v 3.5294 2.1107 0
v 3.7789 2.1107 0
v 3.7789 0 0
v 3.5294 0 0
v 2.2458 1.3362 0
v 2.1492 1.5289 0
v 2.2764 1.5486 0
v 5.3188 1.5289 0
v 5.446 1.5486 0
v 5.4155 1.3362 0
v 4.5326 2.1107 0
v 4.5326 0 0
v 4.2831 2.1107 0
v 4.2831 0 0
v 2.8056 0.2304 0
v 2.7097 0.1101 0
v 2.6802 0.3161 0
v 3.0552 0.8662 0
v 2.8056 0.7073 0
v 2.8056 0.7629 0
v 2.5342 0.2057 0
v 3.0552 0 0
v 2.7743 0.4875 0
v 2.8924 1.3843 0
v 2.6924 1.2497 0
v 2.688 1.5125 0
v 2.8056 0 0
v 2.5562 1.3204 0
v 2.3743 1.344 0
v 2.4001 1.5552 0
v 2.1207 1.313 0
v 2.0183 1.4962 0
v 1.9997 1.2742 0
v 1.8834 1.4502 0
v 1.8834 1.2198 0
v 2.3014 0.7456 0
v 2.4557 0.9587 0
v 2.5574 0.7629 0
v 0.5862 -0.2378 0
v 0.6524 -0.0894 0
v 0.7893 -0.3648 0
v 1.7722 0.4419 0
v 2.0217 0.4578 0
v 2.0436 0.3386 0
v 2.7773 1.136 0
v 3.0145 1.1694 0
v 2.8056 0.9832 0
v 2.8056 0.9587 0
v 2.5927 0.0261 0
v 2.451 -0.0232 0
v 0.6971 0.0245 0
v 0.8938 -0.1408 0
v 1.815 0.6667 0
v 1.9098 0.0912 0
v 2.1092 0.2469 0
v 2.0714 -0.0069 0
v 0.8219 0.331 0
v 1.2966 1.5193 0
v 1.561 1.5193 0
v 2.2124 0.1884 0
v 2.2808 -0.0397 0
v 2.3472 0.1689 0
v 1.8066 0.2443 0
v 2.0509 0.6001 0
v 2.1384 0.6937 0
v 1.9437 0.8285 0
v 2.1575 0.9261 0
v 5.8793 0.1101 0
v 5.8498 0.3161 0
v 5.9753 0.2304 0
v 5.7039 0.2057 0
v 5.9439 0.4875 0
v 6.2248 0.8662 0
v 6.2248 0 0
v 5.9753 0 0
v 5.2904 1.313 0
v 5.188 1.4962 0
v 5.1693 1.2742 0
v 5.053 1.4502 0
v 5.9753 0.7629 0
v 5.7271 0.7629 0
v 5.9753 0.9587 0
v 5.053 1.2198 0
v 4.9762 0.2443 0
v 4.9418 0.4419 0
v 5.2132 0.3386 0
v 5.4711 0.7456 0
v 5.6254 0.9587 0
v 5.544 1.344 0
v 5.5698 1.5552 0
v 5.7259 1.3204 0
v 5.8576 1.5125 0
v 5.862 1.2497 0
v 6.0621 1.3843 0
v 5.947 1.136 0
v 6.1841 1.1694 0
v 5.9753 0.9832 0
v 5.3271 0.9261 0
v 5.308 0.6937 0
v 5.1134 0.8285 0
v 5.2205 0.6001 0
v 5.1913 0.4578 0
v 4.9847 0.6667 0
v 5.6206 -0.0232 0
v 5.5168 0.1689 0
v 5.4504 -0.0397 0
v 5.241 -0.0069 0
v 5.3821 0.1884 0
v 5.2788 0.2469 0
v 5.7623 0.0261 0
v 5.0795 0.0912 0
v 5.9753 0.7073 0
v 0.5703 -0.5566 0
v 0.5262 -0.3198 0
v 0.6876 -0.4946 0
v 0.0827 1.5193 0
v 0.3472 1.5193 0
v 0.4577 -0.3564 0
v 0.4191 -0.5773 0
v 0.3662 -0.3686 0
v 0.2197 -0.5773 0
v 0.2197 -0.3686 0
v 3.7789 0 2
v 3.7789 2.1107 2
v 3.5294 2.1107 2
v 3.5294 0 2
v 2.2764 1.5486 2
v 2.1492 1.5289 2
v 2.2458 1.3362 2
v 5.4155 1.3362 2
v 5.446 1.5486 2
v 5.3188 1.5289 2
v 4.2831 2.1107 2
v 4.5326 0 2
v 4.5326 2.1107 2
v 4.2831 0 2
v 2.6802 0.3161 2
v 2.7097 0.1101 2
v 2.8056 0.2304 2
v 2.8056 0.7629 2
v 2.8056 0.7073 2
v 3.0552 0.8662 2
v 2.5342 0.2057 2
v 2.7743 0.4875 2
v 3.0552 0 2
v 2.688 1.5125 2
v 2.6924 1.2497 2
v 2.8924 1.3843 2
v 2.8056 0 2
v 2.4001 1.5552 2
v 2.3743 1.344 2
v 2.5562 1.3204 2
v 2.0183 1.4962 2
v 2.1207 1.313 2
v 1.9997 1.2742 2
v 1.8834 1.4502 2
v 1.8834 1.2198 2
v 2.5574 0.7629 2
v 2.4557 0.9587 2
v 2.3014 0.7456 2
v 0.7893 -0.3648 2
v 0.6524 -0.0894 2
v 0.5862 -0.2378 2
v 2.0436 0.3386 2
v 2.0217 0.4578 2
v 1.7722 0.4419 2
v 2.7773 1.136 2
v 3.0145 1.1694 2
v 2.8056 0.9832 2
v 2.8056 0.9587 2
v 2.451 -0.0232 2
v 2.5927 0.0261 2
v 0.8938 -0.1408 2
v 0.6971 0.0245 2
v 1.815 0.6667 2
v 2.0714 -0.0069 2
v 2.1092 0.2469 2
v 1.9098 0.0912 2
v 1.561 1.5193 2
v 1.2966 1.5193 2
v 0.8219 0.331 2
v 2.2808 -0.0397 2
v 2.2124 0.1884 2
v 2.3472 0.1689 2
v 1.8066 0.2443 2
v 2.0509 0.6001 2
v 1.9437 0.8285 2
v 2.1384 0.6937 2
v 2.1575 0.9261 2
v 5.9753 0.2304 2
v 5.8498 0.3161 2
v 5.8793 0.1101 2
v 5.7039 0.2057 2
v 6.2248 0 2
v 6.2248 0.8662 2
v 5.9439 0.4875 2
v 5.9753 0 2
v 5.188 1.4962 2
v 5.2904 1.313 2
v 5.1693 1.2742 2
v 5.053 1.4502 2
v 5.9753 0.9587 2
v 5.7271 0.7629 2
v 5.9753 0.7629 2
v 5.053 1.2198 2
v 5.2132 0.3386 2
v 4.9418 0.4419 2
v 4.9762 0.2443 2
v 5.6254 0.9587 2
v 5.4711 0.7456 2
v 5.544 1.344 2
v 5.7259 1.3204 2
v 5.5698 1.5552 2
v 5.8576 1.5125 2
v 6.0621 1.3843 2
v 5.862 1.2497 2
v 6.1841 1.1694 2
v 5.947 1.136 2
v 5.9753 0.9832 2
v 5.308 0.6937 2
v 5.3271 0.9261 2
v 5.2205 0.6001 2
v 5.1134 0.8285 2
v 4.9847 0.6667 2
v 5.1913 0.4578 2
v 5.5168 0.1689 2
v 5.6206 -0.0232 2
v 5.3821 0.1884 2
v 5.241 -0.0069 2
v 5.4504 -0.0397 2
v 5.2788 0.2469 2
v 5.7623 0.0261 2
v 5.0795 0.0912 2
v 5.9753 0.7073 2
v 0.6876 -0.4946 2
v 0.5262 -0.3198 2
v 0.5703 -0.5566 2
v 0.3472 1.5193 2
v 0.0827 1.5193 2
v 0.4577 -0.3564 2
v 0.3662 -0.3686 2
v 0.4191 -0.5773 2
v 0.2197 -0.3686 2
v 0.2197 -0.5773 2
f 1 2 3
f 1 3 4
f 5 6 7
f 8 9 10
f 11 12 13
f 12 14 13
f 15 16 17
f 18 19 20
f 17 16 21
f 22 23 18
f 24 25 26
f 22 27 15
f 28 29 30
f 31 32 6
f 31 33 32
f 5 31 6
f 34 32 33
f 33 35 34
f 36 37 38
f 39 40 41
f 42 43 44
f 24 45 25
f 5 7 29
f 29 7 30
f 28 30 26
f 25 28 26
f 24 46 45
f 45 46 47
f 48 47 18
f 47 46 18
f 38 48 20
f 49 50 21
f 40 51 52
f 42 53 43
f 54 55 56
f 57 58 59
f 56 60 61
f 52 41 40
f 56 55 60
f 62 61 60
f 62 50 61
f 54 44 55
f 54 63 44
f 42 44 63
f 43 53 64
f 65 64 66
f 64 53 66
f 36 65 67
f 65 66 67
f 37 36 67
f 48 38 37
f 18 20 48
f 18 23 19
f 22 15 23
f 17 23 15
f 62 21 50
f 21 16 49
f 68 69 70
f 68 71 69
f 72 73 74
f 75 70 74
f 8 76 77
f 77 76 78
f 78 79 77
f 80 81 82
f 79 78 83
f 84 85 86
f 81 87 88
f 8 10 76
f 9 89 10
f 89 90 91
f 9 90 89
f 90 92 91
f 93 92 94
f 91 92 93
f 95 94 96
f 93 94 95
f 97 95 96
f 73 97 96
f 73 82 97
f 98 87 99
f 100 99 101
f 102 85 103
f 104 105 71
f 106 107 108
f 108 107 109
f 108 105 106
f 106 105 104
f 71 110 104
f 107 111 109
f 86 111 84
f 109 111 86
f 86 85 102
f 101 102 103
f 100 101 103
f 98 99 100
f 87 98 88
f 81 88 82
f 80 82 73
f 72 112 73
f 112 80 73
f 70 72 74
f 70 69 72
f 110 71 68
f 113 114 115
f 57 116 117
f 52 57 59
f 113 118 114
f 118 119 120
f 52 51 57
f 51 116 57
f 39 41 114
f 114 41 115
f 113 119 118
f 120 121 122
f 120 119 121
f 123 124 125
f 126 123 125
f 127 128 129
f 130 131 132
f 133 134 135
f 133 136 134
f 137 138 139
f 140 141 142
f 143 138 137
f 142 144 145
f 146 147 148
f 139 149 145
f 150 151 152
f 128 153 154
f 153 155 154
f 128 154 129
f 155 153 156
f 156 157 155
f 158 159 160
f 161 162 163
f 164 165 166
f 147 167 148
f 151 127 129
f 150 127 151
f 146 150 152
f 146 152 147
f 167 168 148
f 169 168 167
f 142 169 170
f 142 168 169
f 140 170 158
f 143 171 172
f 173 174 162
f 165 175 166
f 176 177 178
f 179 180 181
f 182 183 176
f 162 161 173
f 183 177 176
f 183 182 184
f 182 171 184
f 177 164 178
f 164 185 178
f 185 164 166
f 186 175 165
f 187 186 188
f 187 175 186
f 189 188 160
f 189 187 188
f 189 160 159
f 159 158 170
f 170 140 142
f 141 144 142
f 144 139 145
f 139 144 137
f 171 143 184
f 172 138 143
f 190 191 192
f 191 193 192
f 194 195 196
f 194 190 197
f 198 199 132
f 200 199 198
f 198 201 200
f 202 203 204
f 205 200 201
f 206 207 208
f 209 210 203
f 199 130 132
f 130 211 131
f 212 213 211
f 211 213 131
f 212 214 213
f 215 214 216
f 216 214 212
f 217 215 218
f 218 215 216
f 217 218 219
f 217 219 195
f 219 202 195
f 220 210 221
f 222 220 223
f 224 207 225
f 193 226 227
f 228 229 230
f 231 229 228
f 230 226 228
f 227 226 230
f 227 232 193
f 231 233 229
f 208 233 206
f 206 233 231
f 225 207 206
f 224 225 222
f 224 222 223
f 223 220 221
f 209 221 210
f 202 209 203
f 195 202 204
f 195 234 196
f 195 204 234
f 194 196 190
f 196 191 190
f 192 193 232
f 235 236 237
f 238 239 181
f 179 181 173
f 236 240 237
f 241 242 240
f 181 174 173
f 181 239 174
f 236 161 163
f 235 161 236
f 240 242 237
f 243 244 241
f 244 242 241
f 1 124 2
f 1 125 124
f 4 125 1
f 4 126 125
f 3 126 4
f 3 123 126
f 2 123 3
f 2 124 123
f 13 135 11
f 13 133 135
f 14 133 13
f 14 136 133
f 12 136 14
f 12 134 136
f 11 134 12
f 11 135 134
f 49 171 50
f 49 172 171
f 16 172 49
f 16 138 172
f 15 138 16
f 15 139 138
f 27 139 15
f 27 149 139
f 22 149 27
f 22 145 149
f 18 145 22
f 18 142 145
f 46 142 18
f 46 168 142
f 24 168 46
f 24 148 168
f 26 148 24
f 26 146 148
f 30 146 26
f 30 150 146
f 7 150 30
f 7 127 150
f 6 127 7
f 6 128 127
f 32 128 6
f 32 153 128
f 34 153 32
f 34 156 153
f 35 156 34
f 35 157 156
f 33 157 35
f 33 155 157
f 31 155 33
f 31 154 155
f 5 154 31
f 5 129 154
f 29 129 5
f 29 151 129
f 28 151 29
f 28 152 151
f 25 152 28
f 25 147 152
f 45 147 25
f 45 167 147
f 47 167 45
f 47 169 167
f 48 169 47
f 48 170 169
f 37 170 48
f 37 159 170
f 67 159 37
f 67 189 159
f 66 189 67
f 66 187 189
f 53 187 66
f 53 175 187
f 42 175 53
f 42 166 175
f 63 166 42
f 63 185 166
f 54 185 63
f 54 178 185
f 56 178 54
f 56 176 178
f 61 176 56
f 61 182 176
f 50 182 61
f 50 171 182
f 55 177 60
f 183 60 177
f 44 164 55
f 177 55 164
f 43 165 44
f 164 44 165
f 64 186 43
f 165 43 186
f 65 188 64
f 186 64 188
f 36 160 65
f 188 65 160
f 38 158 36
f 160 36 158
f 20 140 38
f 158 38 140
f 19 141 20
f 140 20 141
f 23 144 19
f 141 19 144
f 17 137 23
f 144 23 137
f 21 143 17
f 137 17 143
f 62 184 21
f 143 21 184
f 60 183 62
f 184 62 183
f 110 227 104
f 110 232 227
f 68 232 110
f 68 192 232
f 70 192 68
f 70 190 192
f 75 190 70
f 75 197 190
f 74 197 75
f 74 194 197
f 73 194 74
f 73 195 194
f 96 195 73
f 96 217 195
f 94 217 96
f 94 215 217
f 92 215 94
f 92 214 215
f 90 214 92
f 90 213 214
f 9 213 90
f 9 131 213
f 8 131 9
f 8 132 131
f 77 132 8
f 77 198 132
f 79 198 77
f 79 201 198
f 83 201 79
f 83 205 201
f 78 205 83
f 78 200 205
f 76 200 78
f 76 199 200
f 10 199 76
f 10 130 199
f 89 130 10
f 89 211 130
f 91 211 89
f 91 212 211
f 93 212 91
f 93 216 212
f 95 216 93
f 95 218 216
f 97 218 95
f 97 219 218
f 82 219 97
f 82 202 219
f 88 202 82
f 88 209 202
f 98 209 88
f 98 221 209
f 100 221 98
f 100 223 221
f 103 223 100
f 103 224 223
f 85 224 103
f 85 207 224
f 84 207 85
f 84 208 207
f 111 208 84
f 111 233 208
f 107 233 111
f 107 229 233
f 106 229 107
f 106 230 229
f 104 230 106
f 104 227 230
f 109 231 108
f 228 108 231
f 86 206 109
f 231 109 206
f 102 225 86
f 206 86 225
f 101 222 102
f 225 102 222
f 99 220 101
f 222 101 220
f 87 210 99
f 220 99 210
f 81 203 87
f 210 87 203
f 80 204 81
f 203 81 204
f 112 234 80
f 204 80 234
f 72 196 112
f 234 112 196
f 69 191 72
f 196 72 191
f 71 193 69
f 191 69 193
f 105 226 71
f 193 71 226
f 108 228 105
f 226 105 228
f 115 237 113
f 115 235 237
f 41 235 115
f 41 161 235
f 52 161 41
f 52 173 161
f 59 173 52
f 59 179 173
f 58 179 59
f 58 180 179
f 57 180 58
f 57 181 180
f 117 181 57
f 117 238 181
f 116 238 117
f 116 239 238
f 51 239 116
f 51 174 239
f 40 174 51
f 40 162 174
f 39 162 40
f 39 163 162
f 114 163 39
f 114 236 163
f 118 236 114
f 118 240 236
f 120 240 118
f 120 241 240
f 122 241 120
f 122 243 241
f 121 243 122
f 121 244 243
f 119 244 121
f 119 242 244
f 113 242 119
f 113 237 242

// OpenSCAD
texte_a_inserer = "yalla"; 
taille = 2; 
police = "BigshotOne"; //[[Abril Fatface,Aclonica,Acme,Advent Pro,Akronim,Aladin,Alegreya,Alegreya Sans,Alegreya SC,Alex Brush,Alfa Slab One,Alice,Amaranth,Architects Daughter,Archivo Black,Archivo Narrow,Arimo,Arvo,Asap,Astloch,Asul,Averia Libre,Averia Serif Libre,Bangers,Basic,Belgrano,Berkshire Swash,Bigshot One,Bilbo Swash Caps,Black Ops One,Bonbon,Bowlby One SC,Brawler,Bubblegum Sans,Butterfly Kids,Cabin Condensed,Caesar Dressing,Cagliostro,Calligraffitti,Capriola,Carter One,Changa One,Chango,Chelsea Market,Cherry Cream Soda,Chewy,Chicle,Chivo,Clicker Script,Coming Soon,Concert One,Condiment,Cookie,Courgette,Covered By Your Grace,Crimson Text,Dancing Script,DejaVu Sans,DejaVu Serif,Dhurjati,Doppio One,Dosis,Droid Sans,Eagle Lake,Electrolize,Emilys Candy,Encode Sans,Encode Sans Compressed,Euphoria Script,Exo,Exo 2,Faster One,Federo,Finger Paint,Fjord One,Fontdiner Swanky,Freckle Face,Fruktur,Gabriela,Geo,Germania One,Give You Glory,Gloria Hallelujah,Goudy Bookletter 1911,Graduate,Grand Hotel,Great Vibes,Griffy,Hanalei Fill,Happy Monkey,Henny Penny,Hind,IM Fell English SC,Indie Flower,Irish Grover,Italianno,Jacques Francois Shadow,Jolly Lodger,Josefin Slab,Joti One,Judson,Just Another Hand,Kalam,Kameron,Karma,Kavoon,Knewave,Kranky,Kristi,Laila,Lakki Reddy,Lancelot,Lato,Leckerli One,Ledger,Lekton,Lemon One,Liberation Sans,Libre Caslon Text,Life Savers,Lilita One,Lily Script One,Limelight,Lobster,Lobster Two,Londrina Outline,Londrina Shadow,Londrina Solid,Lora,Love Ya Like A Sister,Loved by the King,Lovers Quarrel,Luckiest Guy,Lusitana,Macondo,Macondo Swash Caps,Mako,Marck Script,Margarine,Marko One,Maven Pro,McLaren,MedievalSharp,Merienda One,Merriweather,Mervale Script,Metal Mania,Metrophobic,Milonga,Miltonian Tattoo,Miss Fajardose,Molle,Montez,Montserrat,Mr De Haviland,Mystery Quest,Neucha,New Rocker,Niconne,Nosifer,Nothing You Could Do,Noto Sans Oriya,Noto Serif,Nova Square,Nunito,Old Standard TT,Oleo Script,Oleo Script Swash Caps,Orbitron,Oregano,Orienta,Original Surfer,Oswald,Over the Rainbow,Overlock,Oxygen,Pacifico,Paprika,Parisienne,Patrick Hand SC,Paytone One,Peralta,Permanent Marker,Piedra,Pirata One,Play,Playball,Poetsen One,Poppins,Press Start 2P,Princess Sofia,PT Mono,Qwigley,Racing Sans One,Raleway,Rancho,Ranga,Ribeye,Roboto,Roboto Condensed,Roboto Slab,Rochester,Rock Salt,Rubik One,Sail,Salsa,Sansita One,Sarina,Satisfy,Schoolbell,Seaweed Script,Sevillana,Shadows Into Light,Shadows Into Light Two,Share,Six Caps,Skranji,Source Sans Pro,Spicy Rice,Stardos Stencil,Stoke,Syncopate,Teko,Terminal Dosis,The Girl Next Door,Tillana,Timmana,Titillium Web,Ubuntu,Ultra,Underdog,UnifrakturCook,UnifrakturMaguntia,Vampiro One,Vidaloka,Viga,Voces,Volkhov,Vollkorn,Voltaire,Waiting for the Sunrise,Wallpoet,Wellfleet,Wendy One,Yellowtail,Yesteryear,Zeyada]]
hauteur = 2; 
module rendu(){
linear_extrude(hauteur) text(texte_a_inserer,size = taille, font = police);
}
rendu();
 
